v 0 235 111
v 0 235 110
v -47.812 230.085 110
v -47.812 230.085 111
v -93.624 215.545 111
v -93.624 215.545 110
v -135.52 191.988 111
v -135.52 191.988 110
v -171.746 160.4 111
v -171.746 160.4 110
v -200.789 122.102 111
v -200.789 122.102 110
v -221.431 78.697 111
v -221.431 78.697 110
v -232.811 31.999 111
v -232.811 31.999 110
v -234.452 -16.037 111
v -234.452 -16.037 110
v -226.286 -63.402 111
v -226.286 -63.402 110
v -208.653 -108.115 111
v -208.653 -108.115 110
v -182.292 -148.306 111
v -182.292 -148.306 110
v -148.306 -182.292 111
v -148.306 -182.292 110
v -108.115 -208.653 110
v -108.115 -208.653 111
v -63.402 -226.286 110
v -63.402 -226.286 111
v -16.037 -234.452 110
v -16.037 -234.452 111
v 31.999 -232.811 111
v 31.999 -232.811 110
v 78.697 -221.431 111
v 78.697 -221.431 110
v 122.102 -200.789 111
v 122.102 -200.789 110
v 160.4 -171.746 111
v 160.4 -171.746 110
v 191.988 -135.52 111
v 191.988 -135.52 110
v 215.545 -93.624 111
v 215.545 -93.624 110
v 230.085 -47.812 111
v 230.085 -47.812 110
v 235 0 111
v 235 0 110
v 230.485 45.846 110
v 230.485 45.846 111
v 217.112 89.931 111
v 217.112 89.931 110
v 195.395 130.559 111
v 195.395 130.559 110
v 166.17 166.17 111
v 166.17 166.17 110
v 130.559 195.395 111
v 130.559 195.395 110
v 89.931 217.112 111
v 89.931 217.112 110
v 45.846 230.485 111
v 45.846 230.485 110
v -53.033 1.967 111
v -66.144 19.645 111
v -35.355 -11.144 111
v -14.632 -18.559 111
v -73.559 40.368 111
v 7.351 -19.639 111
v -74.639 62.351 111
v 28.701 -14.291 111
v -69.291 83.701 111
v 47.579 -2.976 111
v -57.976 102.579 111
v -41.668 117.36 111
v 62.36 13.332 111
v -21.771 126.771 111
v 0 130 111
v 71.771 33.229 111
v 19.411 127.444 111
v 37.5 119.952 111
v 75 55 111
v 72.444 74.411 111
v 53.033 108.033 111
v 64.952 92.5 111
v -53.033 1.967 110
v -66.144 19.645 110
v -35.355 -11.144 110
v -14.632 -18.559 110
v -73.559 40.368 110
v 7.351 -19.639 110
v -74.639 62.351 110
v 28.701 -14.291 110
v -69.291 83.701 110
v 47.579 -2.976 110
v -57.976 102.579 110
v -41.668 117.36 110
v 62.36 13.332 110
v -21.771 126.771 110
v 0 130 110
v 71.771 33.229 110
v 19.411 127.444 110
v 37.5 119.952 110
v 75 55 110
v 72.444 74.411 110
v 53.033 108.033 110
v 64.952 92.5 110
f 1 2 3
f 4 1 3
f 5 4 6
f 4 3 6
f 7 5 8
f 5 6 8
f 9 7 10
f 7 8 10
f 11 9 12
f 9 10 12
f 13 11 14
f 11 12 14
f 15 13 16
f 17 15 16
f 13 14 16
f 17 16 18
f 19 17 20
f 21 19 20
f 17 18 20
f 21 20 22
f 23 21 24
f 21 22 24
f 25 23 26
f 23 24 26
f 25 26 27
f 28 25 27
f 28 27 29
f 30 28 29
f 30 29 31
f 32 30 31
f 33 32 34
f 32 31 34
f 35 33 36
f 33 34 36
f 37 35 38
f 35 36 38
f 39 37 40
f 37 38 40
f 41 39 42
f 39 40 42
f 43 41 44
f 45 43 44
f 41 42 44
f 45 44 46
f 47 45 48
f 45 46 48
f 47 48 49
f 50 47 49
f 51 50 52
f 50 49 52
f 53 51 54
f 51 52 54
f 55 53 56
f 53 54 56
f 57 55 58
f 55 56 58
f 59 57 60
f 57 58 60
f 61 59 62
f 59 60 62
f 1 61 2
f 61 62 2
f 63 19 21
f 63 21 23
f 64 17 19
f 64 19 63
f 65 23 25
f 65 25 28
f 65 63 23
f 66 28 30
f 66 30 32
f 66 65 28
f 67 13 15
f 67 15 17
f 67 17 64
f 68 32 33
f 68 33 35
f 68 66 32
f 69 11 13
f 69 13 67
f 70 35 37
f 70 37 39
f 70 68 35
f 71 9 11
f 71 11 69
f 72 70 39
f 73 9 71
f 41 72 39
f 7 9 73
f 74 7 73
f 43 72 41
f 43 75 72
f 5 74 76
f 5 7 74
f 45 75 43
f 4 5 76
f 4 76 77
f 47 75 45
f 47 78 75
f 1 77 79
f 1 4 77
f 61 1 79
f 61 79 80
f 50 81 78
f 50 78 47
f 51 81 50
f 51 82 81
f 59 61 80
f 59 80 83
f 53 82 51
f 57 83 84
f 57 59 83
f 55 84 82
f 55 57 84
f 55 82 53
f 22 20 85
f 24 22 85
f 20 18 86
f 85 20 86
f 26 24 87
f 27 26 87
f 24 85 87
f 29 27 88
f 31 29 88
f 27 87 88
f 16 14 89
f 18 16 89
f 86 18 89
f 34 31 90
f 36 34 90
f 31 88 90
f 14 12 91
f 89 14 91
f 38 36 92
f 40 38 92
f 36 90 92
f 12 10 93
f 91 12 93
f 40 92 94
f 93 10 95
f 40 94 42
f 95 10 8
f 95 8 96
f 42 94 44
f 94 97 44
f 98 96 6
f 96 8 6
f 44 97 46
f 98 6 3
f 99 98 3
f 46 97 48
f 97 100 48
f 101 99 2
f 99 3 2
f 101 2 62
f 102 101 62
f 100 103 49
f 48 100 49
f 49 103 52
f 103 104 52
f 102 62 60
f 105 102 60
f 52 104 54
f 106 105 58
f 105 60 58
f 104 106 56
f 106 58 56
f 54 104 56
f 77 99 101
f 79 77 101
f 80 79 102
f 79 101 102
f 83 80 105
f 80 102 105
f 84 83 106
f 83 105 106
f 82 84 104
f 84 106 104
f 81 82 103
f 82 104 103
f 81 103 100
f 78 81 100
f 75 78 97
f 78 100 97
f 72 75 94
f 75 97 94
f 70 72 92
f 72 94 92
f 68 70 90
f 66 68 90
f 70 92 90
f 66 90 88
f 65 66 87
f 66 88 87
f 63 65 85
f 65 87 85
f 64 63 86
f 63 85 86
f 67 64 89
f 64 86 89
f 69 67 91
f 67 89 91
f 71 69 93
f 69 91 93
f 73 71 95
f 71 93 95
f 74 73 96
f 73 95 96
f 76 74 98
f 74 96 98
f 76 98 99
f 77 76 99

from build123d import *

# Parameters (mm, degrees)
F0_W     = 235
F0_H     = 110
F2_T     = -1
F4_DEPTH = 1


with BuildPart() as f1:
    # F0 (on Front) → F1 (revolve)
    with BuildSketch(Plane.XZ):
        with Locations((-117.5, 55)):
            Rectangle(F0_W, F0_H)
    revolve(axis=Axis((0, 0, 55), (0, 0, -1)))

    # F2
    f2_openings = [f1.faces().sort_by_distance(p)[0] for p in [
        (0, 0, 0),
    ]]
    offset(amount=F2_T, openings=f2_openings)


with BuildPart() as f4:
    # F3 (on face) → F4 (new body)
    with BuildSketch(Plane.XY.offset(110)):
        with BuildLine():
            ThreePointArc((235, 0), (166.170094, 166.170094), (0, 235))
            ThreePointArc((0, 235), (-166.170094, -166.170094), (235, 0))
        make_face()
        with BuildLine():
            ThreePointArc((140, 55), (-98.994949, -43.994949), (0, 195))
            ThreePointArc((0, 195), (98.994949, 153.994949), (140, 55))
        make_face(mode=Mode.SUBTRACT)
        with BuildLine():
            ThreePointArc((140, 55), (98.994949, 153.994949), (0, 195))
            ThreePointArc((0, 195), (-98.994949, -43.994949), (140, 55))
        make_face()
        with BuildLine():
            ThreePointArc((75, 55), (-53.033009, 1.966991), (0, 130))
            ThreePointArc((0, 130), (53.033009, 108.033009), (75, 55))
        make_face(mode=Mode.SUBTRACT)
    extrude(amount=F4_DEPTH)


solid = f4.part
